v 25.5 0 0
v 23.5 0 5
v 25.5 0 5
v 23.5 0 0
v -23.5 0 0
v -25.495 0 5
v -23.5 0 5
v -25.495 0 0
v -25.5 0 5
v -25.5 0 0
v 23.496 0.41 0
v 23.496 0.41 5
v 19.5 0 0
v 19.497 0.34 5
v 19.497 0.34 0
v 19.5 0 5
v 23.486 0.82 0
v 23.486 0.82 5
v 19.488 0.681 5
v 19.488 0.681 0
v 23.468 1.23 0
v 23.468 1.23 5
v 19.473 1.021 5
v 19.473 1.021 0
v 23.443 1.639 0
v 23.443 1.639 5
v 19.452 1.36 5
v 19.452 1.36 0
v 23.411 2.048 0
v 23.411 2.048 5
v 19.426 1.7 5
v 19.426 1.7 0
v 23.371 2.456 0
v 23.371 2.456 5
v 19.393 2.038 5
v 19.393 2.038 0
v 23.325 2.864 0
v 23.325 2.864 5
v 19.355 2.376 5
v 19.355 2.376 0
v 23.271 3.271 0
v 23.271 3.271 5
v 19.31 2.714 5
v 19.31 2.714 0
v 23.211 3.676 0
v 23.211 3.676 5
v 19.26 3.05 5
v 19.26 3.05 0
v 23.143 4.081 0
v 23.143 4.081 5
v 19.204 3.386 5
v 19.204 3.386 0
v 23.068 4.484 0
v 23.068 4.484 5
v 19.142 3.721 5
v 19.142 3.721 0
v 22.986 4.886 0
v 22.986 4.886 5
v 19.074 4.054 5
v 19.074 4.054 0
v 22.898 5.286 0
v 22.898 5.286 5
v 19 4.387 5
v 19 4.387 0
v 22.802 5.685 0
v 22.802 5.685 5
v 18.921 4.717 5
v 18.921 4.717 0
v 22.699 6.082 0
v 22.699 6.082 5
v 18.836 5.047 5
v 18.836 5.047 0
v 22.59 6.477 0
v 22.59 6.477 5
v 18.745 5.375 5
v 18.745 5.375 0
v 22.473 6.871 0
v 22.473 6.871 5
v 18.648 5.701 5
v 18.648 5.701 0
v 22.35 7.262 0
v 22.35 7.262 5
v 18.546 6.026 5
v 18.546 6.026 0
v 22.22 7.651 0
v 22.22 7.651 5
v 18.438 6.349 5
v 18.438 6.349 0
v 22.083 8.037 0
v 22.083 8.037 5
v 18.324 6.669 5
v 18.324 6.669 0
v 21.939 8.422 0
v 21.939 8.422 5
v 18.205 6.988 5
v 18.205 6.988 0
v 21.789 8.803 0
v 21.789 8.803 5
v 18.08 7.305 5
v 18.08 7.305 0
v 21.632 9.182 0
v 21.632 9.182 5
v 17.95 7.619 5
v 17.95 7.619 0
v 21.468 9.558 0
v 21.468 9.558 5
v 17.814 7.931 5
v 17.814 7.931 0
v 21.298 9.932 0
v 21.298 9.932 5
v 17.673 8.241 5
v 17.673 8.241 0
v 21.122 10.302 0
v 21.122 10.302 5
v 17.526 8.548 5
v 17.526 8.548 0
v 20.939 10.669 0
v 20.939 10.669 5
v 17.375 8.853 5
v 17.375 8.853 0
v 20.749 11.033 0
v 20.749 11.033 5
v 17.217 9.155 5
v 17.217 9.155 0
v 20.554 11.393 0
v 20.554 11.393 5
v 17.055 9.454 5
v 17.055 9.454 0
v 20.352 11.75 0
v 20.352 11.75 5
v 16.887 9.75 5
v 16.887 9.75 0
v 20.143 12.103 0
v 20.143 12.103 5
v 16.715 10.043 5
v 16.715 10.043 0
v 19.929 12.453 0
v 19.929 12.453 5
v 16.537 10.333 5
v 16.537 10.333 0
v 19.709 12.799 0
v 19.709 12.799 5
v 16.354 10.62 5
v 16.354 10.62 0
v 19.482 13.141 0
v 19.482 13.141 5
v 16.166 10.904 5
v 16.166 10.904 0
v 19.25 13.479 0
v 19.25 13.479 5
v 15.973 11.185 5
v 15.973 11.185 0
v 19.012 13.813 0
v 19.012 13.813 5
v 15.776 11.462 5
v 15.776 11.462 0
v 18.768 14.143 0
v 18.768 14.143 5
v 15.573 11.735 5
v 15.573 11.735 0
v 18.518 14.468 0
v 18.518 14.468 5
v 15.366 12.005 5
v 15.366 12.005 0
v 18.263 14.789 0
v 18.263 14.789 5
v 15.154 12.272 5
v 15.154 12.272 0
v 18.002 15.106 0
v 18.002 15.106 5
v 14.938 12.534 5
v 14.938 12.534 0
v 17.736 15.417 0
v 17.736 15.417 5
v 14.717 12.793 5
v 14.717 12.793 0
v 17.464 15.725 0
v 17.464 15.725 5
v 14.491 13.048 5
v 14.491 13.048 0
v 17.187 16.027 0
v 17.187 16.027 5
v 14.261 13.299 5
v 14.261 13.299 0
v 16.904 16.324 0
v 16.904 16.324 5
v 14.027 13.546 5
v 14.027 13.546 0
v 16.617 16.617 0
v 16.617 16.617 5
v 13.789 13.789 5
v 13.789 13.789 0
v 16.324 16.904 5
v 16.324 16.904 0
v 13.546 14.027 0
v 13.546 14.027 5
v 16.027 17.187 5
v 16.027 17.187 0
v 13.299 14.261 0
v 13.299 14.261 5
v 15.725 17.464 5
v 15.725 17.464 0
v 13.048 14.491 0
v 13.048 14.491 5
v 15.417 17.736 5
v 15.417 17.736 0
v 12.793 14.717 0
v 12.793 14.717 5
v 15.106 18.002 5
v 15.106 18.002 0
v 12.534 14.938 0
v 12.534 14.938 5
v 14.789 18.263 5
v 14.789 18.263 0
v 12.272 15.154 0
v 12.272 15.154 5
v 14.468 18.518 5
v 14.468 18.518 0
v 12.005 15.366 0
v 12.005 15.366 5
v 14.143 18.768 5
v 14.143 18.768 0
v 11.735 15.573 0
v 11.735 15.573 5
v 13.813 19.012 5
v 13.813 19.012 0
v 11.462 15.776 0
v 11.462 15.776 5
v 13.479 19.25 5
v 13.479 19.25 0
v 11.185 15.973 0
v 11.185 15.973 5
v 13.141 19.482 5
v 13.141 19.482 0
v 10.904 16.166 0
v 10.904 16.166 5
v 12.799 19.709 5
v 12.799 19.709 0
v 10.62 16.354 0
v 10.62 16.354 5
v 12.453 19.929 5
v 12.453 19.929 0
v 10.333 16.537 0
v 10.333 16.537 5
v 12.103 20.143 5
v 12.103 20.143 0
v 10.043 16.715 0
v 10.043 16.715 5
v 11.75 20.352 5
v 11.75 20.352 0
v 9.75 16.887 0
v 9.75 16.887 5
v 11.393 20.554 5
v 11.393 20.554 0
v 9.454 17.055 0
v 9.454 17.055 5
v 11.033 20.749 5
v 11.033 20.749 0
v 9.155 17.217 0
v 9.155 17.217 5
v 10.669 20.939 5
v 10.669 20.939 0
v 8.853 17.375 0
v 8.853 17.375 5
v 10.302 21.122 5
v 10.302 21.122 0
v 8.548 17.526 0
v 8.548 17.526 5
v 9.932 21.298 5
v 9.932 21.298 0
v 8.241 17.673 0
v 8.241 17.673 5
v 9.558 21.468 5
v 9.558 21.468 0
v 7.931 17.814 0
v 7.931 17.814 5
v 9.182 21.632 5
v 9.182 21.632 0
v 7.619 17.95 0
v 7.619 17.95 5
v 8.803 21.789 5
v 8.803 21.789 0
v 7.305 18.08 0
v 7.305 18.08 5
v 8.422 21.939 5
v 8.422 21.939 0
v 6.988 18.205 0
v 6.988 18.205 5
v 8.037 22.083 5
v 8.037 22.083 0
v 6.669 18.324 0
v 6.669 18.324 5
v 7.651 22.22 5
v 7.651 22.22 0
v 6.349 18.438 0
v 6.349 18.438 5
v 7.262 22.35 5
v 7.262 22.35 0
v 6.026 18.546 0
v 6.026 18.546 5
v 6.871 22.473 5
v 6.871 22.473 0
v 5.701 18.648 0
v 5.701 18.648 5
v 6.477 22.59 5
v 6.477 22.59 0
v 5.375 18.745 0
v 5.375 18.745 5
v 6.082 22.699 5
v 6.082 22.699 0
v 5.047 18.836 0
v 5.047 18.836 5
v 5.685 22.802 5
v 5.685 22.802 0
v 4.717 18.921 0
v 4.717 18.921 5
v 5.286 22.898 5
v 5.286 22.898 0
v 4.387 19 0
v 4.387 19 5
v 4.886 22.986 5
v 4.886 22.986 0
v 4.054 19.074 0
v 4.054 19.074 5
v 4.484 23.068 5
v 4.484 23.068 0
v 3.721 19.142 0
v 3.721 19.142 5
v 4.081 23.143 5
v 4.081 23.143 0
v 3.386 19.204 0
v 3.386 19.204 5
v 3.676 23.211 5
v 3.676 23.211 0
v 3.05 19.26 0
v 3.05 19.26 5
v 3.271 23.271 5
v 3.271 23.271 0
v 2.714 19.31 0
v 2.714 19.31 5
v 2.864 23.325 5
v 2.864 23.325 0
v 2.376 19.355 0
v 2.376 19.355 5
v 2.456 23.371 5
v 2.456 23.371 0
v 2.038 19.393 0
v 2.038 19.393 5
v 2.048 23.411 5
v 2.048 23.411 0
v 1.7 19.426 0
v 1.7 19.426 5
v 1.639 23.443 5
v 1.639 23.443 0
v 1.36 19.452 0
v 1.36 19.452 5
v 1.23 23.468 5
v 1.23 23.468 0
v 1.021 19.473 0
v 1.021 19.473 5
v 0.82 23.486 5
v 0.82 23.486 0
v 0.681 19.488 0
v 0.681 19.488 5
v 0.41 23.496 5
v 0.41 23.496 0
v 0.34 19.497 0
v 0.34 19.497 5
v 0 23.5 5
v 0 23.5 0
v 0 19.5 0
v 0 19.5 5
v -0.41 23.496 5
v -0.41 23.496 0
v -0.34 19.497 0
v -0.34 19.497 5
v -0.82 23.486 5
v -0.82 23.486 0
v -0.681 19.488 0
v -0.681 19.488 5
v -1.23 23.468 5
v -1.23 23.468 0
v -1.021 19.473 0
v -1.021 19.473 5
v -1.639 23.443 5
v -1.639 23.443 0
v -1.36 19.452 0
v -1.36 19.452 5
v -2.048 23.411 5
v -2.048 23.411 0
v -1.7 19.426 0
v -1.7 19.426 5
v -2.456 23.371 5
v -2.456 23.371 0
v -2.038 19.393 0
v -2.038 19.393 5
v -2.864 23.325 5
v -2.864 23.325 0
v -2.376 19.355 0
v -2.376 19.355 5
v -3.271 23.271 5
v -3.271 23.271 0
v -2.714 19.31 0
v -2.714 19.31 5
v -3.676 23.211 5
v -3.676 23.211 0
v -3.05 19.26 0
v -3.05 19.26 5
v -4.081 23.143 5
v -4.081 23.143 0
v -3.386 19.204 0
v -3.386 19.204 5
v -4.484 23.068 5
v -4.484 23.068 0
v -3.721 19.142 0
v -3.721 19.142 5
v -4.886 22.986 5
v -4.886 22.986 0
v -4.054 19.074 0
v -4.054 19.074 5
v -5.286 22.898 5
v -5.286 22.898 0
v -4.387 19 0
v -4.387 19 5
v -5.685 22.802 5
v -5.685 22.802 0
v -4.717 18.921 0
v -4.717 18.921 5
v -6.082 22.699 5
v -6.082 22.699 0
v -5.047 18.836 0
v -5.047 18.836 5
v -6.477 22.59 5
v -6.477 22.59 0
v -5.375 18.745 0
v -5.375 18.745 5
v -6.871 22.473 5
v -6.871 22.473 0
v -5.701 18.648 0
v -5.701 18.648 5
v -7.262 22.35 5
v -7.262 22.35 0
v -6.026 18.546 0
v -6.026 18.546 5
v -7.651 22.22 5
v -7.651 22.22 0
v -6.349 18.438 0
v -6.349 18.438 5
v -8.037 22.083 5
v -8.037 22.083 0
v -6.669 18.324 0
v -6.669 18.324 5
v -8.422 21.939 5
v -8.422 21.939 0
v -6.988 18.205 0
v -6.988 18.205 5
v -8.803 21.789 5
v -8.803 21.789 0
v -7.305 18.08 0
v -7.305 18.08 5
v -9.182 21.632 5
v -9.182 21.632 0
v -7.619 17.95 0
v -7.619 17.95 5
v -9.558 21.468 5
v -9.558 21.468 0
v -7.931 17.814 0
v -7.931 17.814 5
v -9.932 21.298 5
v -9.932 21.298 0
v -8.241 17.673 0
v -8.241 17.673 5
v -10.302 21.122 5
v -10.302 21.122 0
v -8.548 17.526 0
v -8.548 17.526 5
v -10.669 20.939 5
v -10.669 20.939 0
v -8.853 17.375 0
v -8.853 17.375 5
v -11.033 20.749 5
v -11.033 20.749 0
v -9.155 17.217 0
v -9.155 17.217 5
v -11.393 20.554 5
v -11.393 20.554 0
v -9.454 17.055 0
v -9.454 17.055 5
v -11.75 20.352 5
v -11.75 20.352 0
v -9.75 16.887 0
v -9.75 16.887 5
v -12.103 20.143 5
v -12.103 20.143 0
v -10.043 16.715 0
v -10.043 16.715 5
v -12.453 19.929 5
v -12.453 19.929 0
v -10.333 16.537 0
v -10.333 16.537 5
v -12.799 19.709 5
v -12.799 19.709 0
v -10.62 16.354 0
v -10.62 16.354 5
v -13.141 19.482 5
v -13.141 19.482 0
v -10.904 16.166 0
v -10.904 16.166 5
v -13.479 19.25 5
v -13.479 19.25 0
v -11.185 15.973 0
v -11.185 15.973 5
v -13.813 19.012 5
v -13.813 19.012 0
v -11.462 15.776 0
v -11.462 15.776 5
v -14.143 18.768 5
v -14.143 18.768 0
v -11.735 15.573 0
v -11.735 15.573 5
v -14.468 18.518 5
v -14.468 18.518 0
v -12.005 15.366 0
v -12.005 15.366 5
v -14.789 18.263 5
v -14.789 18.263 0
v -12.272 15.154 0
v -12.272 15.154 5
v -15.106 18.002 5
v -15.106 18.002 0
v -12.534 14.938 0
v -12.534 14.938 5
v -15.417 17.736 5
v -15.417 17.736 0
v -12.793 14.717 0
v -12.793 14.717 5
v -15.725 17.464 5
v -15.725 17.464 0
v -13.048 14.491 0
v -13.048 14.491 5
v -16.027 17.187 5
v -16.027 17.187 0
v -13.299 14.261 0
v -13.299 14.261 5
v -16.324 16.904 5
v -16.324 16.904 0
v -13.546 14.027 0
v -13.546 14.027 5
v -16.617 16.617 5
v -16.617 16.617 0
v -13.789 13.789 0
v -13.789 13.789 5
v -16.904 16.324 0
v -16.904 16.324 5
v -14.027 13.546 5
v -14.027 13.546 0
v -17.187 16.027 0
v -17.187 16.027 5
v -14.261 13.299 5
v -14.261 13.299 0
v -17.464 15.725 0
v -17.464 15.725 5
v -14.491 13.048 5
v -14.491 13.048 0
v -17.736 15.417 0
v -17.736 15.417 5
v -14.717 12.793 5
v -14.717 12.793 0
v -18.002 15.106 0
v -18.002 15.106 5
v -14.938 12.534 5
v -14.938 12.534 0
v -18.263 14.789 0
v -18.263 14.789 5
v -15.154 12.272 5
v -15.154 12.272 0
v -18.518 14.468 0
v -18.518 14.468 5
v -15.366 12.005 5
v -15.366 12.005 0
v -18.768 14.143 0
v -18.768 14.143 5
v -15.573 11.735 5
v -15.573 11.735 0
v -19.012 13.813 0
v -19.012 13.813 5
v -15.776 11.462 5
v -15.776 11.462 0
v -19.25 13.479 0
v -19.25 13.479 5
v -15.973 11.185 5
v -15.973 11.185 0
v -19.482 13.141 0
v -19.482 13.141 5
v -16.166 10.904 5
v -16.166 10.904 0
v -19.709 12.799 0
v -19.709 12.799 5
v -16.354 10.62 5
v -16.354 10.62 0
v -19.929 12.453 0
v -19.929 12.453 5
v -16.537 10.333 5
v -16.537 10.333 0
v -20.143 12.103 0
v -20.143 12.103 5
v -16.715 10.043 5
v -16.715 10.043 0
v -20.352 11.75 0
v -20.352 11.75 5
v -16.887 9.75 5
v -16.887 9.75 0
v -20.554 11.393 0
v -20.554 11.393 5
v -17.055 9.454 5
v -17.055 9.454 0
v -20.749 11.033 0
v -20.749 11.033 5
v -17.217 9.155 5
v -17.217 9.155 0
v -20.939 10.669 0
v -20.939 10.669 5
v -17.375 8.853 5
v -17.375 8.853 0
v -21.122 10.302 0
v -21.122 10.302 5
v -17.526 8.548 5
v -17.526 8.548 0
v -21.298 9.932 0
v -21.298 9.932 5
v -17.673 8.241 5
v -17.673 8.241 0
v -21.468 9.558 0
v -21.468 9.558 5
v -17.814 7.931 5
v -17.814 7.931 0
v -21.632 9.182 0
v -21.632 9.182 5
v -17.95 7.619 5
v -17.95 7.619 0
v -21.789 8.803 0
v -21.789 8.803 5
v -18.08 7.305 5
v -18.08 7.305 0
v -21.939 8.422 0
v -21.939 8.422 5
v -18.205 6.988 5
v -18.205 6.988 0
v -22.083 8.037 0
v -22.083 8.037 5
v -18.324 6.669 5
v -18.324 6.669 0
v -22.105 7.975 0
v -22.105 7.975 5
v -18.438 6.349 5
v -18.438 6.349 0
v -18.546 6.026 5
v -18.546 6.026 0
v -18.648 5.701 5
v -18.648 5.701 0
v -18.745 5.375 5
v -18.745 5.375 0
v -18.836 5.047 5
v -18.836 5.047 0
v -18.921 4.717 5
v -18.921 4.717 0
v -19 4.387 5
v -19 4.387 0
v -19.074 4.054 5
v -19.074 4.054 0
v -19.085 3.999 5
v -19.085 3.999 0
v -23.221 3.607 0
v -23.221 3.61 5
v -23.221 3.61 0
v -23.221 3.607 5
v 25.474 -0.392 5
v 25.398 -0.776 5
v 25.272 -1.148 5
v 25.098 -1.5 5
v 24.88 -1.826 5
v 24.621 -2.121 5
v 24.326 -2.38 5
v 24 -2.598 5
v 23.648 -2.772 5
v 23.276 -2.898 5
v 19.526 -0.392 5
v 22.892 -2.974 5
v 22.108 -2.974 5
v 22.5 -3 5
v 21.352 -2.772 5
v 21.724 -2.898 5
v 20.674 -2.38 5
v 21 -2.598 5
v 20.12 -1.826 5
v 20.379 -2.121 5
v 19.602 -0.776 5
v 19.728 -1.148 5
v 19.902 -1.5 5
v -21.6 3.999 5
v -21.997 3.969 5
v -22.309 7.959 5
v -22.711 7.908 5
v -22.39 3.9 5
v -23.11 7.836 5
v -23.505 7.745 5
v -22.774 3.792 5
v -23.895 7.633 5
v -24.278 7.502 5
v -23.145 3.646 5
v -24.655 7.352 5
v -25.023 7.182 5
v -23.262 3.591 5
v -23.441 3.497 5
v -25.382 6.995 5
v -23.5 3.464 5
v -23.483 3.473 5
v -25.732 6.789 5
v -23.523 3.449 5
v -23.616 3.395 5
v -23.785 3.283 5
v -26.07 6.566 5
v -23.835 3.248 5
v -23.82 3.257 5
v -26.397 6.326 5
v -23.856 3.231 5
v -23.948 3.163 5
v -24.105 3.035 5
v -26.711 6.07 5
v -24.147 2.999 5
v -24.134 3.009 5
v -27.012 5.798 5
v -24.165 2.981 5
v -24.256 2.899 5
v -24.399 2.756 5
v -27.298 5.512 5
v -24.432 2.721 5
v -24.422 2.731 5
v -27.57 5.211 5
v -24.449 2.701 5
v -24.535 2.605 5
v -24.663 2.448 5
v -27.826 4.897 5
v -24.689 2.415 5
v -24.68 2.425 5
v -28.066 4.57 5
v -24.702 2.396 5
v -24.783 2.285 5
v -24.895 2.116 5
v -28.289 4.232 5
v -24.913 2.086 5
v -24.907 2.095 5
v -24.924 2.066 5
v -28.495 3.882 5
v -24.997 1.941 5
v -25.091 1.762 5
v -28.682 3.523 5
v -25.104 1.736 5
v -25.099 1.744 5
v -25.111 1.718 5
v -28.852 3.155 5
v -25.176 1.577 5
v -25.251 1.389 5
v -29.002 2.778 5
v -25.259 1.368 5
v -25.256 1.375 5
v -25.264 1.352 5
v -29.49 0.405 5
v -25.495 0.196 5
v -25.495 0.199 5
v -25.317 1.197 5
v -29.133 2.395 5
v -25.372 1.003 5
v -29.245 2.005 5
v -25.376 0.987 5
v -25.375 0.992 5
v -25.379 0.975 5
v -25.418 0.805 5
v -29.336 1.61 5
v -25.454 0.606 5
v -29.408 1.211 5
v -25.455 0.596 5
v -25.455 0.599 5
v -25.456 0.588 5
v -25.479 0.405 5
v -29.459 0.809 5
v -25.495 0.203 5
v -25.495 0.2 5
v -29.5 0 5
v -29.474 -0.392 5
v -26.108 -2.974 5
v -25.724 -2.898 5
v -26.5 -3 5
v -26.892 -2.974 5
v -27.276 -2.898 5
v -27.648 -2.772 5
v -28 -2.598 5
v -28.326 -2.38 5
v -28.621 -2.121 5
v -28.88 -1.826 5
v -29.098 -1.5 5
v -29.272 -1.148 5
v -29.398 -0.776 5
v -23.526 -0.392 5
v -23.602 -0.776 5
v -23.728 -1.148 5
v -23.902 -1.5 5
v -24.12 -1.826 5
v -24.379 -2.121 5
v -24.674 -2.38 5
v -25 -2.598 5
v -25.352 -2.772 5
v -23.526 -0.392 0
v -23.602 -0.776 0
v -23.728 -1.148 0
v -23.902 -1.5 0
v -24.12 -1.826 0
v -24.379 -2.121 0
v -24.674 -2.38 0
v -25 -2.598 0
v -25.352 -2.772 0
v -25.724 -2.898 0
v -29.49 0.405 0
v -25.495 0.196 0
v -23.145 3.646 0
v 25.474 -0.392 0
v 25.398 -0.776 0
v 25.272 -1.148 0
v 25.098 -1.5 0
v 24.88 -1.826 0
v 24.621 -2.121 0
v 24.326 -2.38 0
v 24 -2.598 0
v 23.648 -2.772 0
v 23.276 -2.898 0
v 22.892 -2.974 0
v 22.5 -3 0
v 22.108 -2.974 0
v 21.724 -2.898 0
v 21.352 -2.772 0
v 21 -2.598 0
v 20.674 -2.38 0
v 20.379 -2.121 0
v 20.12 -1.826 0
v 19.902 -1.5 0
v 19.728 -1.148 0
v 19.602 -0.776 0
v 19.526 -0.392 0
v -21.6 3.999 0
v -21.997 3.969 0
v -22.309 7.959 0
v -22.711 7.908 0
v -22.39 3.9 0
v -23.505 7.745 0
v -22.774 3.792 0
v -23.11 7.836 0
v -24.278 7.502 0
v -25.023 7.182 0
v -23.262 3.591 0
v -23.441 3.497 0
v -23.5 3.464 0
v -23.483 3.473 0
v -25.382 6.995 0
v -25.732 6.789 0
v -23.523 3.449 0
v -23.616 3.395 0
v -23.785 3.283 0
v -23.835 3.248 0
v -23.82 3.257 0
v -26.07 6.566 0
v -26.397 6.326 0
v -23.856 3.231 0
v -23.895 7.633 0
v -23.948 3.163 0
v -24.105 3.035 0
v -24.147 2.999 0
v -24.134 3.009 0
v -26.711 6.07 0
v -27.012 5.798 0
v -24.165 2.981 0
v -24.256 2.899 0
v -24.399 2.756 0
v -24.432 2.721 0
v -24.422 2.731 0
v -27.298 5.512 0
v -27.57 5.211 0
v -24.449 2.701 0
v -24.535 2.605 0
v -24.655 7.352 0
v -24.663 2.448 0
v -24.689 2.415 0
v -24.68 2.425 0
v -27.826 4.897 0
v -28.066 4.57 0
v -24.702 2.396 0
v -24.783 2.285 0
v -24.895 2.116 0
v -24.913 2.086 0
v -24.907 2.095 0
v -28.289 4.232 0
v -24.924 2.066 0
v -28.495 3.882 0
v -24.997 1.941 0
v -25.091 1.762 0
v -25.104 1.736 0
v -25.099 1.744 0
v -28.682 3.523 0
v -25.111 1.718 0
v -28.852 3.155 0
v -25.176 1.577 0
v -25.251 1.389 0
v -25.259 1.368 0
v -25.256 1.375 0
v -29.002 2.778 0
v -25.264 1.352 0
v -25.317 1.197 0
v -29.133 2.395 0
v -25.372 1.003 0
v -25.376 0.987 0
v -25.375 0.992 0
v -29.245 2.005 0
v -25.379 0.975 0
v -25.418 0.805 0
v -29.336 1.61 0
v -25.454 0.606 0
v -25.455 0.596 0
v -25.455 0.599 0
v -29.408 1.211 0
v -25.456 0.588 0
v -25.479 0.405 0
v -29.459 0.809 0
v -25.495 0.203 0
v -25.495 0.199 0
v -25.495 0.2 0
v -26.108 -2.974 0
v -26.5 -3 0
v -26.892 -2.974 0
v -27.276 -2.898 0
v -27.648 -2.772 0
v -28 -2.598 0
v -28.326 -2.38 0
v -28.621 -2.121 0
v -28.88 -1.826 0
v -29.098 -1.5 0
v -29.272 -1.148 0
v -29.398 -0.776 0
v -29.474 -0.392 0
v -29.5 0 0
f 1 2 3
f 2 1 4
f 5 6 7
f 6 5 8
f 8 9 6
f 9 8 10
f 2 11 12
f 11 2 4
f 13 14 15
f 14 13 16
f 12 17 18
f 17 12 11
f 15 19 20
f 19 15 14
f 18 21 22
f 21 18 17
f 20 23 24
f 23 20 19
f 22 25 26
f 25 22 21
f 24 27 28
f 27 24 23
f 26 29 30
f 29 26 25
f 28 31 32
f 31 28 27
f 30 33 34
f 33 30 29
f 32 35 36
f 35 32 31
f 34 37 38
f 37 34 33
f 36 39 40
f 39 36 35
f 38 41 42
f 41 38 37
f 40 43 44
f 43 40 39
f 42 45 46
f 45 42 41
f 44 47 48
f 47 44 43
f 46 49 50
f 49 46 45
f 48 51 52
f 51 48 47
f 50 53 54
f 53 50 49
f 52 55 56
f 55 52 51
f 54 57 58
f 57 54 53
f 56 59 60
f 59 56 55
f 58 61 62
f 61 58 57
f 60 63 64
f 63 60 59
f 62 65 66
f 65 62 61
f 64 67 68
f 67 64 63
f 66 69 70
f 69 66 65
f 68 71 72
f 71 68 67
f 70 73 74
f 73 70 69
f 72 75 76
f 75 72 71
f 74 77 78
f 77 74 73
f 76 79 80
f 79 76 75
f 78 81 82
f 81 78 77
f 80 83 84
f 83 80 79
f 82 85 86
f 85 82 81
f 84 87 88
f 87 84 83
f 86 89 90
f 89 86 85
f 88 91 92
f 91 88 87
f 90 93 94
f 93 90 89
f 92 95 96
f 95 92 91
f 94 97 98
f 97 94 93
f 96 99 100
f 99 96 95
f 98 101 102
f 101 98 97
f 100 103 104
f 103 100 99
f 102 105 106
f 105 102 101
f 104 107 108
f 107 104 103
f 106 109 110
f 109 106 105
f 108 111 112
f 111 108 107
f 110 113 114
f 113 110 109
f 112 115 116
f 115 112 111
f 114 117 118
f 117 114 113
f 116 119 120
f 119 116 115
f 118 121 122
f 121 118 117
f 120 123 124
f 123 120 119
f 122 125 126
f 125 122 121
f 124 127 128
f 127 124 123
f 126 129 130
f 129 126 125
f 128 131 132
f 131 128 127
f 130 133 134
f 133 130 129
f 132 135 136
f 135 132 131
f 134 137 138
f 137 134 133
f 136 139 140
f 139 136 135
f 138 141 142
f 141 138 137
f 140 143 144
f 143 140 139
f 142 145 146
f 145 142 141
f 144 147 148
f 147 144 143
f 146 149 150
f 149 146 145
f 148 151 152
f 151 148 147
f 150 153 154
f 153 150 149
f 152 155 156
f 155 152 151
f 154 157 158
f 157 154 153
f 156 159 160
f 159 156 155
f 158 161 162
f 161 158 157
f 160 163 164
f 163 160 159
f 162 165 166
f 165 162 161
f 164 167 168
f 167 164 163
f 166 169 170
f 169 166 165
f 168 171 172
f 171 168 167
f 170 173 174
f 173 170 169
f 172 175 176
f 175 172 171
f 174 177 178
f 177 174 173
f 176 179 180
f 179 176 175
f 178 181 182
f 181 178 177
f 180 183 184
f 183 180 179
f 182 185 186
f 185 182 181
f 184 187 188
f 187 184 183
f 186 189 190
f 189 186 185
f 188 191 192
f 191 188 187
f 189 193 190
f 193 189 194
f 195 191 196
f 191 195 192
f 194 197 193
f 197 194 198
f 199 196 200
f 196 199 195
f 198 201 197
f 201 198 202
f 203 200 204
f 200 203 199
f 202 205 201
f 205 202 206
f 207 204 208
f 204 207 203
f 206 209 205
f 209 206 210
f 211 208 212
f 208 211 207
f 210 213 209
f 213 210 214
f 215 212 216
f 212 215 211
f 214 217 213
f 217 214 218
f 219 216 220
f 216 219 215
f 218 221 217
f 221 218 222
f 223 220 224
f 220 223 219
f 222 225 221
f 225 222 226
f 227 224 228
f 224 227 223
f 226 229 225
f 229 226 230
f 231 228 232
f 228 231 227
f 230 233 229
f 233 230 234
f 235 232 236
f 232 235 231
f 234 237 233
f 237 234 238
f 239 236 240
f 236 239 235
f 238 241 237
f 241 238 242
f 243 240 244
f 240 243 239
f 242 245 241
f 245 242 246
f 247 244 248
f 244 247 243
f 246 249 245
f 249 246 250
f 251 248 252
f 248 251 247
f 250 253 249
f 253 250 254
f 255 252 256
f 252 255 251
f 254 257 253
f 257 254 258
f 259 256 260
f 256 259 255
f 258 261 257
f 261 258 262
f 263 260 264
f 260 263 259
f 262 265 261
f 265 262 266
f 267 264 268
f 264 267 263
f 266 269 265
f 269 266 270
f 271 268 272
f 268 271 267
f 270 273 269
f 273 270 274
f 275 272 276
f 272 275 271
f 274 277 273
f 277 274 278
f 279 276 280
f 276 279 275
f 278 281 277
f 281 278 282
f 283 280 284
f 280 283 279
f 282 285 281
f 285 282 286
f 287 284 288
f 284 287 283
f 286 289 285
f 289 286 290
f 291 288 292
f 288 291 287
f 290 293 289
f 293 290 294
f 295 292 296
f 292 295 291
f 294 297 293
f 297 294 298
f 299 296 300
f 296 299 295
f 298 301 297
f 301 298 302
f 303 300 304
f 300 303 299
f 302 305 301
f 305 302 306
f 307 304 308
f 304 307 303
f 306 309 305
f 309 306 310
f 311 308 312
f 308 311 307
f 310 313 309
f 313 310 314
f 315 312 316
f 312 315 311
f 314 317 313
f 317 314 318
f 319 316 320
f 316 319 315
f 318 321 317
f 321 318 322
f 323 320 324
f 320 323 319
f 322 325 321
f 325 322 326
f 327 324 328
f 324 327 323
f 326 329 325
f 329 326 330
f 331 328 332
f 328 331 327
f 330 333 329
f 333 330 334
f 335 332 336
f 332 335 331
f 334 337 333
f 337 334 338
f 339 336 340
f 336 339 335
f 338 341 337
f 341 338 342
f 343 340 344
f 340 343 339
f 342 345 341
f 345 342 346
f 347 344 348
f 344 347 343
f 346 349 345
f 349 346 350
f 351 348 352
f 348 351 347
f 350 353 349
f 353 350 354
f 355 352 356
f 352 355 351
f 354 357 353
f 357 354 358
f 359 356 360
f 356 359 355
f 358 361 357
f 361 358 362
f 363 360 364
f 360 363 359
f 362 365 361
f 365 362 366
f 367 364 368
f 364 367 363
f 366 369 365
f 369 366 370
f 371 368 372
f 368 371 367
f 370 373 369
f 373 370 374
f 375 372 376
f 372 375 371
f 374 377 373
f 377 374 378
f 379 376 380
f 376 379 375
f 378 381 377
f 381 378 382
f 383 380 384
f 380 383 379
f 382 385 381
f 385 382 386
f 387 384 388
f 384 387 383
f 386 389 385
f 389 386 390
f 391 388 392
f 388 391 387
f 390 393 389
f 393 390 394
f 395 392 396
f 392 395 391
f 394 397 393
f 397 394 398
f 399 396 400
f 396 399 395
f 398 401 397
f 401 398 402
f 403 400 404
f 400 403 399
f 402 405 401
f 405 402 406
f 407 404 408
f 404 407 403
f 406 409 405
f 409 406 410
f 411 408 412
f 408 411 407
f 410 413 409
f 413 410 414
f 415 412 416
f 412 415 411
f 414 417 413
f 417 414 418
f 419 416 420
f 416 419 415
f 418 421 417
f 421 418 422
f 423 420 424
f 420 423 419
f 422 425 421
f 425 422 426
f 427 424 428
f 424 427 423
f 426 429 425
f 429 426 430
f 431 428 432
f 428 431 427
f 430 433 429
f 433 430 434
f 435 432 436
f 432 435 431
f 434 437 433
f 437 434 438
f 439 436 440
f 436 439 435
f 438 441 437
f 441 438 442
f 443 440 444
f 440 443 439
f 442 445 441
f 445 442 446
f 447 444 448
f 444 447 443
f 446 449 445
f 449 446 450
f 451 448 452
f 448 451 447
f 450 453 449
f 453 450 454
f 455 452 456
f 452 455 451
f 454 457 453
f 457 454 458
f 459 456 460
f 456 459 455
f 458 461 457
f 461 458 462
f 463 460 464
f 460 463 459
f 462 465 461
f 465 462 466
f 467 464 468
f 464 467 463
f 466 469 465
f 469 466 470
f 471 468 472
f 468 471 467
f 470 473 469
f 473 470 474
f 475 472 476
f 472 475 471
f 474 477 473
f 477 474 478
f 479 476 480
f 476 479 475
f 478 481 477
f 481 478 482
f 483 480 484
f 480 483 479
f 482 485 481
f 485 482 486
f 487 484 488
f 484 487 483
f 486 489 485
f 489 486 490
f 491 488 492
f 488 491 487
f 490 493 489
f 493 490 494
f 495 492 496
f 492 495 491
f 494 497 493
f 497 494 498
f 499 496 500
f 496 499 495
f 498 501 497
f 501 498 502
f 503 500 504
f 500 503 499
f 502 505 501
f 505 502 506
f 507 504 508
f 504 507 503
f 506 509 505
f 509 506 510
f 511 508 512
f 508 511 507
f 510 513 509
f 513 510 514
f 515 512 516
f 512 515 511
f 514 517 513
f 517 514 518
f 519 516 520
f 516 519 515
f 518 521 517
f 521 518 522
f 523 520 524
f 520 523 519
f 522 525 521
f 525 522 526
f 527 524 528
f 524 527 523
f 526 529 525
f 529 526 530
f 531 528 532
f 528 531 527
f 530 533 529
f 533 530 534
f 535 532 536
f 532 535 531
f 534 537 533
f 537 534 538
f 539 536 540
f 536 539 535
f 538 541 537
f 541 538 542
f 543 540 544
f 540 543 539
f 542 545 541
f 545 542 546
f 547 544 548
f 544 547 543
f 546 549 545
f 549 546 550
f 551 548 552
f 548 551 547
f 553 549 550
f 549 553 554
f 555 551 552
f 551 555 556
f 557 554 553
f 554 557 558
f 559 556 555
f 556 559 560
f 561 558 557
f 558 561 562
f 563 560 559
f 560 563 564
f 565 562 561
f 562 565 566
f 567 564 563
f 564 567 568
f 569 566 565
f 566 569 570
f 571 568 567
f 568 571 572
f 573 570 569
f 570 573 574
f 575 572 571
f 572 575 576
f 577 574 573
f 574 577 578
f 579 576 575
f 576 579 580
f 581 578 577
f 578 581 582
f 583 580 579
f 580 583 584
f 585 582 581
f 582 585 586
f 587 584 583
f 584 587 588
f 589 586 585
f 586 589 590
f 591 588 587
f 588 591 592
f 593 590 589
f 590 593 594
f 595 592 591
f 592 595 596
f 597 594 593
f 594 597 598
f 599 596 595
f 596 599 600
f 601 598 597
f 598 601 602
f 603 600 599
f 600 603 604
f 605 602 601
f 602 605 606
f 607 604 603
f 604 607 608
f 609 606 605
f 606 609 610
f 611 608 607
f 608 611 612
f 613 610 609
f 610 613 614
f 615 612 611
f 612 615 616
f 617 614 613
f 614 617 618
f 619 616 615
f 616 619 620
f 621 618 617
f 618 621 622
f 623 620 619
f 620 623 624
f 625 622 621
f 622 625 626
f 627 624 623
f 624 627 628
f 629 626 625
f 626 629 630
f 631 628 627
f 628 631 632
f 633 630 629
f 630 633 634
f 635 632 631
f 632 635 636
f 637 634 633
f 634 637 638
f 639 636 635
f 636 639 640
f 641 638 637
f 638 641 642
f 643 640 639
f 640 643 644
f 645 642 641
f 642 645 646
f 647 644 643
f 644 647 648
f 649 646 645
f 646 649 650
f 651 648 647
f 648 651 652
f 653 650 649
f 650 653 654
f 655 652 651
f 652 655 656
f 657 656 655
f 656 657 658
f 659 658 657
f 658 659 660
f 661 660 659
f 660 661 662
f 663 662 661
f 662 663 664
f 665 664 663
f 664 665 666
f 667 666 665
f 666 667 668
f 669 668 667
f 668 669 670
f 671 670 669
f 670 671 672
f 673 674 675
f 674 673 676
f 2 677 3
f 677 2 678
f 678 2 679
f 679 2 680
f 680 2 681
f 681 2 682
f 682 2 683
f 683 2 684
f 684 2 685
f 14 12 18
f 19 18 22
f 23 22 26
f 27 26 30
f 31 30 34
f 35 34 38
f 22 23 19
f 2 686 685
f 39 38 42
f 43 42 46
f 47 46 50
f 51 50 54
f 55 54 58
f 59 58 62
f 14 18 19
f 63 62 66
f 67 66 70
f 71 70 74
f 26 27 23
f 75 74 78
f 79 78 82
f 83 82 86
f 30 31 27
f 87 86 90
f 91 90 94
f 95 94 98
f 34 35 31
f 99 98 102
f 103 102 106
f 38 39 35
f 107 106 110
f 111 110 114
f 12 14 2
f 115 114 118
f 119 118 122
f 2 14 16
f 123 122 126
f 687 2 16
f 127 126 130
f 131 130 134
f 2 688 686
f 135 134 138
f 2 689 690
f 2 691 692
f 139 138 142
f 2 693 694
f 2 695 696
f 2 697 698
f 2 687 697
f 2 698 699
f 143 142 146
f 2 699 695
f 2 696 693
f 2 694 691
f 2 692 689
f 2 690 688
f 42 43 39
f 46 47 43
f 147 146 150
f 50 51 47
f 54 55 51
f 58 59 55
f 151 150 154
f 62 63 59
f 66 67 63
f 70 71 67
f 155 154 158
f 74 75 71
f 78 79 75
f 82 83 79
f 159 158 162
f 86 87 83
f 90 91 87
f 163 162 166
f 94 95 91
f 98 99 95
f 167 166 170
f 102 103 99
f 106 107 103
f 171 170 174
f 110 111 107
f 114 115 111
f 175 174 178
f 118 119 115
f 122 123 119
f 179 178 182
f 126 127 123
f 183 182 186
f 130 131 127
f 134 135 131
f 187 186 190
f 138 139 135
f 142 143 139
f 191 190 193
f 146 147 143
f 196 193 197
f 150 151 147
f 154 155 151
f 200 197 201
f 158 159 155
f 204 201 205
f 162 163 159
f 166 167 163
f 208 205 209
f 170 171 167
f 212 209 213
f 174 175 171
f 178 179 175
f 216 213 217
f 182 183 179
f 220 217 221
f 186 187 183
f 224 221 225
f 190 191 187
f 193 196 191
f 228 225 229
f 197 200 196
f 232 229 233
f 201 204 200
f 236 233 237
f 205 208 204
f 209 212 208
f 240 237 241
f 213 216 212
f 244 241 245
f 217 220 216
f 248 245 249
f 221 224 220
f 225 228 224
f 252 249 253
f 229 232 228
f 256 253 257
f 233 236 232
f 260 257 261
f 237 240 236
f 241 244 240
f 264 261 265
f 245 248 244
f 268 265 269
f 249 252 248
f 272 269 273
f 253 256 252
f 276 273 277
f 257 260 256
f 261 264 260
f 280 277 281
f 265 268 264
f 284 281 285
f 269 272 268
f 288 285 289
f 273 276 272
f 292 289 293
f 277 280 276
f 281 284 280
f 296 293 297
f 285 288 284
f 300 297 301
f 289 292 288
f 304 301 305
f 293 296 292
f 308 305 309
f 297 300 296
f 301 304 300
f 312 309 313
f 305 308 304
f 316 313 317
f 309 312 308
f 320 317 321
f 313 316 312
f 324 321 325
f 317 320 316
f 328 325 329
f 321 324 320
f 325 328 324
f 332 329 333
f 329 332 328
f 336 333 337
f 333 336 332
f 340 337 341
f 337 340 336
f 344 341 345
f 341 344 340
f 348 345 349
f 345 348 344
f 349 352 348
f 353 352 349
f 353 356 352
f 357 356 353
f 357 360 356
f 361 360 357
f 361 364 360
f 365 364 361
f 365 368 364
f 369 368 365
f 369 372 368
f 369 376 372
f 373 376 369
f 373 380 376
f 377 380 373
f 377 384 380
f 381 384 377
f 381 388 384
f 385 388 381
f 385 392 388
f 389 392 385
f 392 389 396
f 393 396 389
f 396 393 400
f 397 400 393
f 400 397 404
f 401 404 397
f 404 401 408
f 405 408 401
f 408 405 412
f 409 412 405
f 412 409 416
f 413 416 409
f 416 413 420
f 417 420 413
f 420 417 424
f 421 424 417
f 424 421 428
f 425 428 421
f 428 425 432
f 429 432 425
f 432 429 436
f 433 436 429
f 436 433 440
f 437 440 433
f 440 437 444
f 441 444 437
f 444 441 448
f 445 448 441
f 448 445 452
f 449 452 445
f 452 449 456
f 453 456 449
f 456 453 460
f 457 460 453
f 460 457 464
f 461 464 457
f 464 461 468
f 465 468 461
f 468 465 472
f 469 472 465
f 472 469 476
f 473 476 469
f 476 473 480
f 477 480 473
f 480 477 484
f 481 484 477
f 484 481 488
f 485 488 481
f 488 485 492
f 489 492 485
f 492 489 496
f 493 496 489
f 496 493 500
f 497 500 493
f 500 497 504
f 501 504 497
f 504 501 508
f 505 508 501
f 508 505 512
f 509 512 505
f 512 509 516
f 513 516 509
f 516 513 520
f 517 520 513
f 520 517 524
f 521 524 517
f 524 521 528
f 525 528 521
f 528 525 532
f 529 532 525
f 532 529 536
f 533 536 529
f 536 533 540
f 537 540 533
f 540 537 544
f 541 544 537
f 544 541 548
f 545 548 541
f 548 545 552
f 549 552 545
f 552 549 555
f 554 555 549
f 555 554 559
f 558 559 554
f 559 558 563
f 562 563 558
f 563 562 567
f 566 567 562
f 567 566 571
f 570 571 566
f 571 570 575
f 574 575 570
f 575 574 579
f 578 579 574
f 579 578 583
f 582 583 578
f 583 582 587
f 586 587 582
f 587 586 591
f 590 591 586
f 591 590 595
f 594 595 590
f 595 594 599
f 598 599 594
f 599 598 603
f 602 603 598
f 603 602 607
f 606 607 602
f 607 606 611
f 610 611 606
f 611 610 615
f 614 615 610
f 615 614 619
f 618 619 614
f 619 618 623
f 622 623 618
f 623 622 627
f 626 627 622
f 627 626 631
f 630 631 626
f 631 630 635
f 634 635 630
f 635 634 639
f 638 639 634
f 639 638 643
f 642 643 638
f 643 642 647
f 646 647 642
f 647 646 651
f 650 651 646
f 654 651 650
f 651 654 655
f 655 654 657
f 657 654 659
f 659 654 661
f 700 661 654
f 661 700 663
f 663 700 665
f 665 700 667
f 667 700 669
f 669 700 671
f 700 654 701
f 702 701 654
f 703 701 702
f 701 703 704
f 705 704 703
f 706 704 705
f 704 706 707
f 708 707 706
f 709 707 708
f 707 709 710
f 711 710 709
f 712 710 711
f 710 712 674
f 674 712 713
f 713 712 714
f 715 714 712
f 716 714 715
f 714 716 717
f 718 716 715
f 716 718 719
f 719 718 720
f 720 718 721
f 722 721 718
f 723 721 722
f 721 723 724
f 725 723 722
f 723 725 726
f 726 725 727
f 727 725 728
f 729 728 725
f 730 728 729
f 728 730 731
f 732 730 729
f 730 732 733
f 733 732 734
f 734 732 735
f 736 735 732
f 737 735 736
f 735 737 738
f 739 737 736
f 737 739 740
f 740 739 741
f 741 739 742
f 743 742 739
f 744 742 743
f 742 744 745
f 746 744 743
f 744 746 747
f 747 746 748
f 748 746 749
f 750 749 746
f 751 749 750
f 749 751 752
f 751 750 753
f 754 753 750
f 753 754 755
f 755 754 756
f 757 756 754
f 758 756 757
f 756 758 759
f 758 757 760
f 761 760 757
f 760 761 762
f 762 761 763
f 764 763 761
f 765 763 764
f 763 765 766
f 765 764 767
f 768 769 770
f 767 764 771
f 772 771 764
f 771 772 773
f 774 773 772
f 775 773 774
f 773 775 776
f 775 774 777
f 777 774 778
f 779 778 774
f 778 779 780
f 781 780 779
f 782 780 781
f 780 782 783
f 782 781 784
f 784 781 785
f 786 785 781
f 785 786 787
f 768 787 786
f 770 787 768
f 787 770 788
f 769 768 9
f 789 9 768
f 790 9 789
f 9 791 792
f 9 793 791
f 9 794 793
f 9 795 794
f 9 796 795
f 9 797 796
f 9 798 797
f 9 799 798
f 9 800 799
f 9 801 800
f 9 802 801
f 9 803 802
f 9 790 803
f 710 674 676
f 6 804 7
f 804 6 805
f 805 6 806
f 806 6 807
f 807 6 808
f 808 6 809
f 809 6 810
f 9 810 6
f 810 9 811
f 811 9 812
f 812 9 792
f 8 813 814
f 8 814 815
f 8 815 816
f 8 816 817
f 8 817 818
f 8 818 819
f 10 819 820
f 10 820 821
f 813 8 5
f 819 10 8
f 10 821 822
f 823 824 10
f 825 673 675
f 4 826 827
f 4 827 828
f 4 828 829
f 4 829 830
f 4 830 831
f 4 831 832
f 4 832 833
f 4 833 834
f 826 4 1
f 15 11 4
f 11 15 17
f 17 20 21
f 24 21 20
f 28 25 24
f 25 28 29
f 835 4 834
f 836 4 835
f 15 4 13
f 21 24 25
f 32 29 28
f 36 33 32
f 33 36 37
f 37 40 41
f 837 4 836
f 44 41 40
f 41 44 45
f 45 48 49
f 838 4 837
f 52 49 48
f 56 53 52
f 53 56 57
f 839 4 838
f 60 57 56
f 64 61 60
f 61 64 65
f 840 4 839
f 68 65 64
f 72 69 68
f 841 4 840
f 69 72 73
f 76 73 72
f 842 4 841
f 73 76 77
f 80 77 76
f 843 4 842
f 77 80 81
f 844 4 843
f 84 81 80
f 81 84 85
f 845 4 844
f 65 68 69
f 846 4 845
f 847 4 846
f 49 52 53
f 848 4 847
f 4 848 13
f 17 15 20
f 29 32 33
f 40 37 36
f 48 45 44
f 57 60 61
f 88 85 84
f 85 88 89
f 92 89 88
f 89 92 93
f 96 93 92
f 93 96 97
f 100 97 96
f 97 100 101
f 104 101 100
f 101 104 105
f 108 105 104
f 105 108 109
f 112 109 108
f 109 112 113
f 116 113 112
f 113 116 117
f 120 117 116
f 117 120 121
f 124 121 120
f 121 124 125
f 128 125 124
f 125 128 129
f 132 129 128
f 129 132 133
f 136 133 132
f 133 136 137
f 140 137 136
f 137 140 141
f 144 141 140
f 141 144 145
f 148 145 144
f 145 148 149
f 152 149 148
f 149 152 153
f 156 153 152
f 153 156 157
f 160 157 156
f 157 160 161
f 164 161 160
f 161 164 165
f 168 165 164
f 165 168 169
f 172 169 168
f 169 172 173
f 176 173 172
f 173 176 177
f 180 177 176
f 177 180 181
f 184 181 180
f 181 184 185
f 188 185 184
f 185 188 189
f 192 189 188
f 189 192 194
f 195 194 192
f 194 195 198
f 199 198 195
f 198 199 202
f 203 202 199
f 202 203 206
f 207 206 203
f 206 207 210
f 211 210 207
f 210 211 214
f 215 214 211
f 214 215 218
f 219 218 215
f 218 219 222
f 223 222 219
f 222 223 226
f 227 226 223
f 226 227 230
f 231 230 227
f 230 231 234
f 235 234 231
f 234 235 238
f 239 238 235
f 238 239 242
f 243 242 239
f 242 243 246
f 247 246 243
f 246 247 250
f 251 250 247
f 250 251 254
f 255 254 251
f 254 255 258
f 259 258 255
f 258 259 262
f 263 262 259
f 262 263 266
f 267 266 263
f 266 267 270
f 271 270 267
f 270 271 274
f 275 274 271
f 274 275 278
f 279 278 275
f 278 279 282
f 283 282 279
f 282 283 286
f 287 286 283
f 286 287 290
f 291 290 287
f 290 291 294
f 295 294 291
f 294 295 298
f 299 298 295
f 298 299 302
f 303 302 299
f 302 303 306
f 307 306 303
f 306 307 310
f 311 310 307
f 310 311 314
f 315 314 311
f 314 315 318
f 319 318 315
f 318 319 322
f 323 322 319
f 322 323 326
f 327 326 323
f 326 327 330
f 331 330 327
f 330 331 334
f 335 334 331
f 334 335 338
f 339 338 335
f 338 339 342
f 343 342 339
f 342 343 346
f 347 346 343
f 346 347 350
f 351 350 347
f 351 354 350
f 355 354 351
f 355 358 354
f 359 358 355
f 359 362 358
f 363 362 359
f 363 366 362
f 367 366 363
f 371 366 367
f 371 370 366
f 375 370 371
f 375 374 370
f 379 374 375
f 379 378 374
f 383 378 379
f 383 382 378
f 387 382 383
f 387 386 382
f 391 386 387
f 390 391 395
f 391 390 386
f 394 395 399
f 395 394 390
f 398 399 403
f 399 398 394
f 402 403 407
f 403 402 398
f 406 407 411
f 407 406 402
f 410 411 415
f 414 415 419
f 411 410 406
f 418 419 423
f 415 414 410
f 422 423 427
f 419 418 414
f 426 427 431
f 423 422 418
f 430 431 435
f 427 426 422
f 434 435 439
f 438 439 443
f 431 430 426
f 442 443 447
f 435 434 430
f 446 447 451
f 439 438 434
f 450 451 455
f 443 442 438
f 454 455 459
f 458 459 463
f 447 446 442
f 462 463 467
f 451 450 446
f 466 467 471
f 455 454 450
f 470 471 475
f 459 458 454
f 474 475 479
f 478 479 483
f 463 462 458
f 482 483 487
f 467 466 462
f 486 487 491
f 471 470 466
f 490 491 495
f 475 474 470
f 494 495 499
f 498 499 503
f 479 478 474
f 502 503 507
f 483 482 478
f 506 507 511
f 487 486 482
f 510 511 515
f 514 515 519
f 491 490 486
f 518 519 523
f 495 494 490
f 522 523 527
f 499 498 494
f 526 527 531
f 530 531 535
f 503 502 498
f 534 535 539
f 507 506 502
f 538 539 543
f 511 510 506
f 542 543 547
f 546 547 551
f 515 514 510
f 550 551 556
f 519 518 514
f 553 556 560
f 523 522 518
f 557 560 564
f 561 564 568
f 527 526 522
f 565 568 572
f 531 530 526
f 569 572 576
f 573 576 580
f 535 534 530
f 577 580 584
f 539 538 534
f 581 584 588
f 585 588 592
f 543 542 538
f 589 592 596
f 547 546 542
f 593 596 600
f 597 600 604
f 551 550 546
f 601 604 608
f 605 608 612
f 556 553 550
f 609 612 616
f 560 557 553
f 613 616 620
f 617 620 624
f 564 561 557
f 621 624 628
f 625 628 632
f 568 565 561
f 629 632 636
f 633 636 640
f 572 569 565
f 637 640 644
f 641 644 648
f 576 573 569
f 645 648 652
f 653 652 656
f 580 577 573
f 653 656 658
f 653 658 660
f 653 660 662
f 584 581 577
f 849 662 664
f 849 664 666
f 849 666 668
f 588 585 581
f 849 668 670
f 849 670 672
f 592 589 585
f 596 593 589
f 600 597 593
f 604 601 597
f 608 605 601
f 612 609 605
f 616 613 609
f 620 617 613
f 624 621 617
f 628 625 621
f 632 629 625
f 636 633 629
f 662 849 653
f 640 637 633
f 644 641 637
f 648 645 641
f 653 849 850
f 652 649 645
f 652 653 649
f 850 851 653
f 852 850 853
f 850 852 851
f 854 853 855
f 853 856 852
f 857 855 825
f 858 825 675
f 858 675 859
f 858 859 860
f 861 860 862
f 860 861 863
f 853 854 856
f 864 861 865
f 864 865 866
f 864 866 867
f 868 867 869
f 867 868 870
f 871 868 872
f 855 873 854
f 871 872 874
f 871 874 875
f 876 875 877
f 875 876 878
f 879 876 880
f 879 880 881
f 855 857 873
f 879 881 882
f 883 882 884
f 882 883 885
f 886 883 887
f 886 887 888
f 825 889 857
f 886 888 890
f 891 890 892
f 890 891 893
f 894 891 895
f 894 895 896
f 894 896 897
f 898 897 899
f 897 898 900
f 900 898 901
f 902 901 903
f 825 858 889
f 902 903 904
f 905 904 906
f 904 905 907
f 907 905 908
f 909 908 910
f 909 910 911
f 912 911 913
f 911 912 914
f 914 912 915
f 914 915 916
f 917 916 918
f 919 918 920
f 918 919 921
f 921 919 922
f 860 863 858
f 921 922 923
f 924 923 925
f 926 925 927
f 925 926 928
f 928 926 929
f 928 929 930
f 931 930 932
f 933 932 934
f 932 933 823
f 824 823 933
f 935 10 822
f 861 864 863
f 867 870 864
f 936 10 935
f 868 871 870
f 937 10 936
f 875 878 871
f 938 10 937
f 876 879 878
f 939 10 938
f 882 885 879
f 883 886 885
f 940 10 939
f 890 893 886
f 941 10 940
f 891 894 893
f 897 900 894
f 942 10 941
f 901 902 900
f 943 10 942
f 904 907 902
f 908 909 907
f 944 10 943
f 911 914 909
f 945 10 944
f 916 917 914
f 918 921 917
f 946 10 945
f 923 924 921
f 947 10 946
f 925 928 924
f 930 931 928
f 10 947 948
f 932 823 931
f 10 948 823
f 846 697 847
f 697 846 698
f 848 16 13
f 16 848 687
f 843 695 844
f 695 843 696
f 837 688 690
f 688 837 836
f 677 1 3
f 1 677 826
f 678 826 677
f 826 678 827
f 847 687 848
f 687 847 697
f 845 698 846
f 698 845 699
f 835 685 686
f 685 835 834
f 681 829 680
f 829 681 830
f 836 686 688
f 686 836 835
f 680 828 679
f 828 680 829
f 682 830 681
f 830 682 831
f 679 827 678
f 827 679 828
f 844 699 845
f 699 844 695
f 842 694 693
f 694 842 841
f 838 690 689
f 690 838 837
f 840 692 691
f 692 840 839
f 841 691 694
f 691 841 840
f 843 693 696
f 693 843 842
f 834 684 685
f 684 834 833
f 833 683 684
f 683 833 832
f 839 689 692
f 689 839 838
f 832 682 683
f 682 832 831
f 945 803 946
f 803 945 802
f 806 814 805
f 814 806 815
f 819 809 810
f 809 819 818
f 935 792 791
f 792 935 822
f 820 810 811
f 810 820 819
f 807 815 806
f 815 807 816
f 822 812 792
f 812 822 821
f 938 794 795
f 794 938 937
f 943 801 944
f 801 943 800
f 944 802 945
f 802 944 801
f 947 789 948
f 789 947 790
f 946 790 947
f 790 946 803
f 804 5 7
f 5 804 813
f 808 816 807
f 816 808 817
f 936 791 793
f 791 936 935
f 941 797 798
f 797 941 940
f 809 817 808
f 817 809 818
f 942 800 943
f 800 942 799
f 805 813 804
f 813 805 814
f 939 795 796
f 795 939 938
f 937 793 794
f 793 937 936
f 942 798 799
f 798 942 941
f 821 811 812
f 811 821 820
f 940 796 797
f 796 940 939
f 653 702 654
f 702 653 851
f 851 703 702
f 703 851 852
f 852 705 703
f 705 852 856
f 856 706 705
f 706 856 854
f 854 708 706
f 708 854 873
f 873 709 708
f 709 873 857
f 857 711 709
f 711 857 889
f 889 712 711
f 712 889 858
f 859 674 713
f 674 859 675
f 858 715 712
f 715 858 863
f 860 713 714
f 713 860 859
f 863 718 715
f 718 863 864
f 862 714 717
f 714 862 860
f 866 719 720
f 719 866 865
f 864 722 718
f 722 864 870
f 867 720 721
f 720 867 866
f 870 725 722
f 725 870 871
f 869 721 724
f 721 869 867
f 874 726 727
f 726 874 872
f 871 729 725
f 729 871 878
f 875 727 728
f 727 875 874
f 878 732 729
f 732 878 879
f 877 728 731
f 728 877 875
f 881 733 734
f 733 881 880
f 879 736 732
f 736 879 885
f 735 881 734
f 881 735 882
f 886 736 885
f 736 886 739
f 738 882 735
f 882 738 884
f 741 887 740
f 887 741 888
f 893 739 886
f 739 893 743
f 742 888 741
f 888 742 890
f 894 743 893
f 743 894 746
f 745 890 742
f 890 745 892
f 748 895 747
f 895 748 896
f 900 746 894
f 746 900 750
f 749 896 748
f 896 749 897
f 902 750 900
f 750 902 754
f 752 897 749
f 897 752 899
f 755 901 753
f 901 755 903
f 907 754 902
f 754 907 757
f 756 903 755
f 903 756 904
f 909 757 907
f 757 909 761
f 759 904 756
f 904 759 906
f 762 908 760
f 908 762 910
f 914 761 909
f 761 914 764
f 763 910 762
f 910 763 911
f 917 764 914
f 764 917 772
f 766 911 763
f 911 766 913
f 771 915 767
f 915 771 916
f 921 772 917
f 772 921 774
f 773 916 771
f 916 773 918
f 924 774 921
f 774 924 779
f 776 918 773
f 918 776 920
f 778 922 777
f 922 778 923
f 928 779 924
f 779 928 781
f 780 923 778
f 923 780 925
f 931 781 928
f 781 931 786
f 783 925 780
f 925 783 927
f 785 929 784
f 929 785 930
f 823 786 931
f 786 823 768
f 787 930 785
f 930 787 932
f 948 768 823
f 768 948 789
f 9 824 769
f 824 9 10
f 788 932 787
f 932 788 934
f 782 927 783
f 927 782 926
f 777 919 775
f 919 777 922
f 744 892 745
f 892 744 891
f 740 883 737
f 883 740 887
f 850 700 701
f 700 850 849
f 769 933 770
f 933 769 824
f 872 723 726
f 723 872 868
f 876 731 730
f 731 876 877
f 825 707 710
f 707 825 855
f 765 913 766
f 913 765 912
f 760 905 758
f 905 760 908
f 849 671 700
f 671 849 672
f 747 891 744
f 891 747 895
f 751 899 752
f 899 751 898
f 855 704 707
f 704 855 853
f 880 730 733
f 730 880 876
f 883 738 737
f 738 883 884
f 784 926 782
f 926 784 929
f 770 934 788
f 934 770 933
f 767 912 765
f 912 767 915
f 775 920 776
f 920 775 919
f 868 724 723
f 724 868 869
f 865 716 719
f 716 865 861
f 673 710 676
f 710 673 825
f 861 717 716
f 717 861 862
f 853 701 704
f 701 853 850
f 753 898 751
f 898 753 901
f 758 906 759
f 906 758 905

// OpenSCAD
// file: interlocking_snap_ring.scad
module half_cylinder(diameter, height) {
    linear_extrude(height)
        difference() {
            circle(diameter / 2);
            translate([0, -diameter/2, 0])
                square(diameter, center=true);
        }
}

module interlocking_snap_ring_helper(inner_radius, thickness, height) {
    rotate_extrude(angle=180)
        translate([inner_radius, 0, 0])
        square([thickness, height]);
    translate([inner_radius + thickness*.75, 0, 0])
        rotate([0, 0, 180])
        half_cylinder(thickness*1.5, height);
    translate([-(inner_radius + (thickness*1.75)), 0, 0])
        rotate([0, 0, 180])
        half_cylinder(thickness*1.5, height);
    translate([-(inner_radius + thickness*.5), 0, 0])
        rotate([0, 0, 90])
        rotate_extrude(angle=90)
        translate([thickness, 0, 0])
        square([thickness, height]);
}

module interlocking_snap_ring(inner_diameter, thickness, height) {
    inner_radius = inner_diameter / 2;
    difference() {
        interlocking_snap_ring_helper(inner_radius, thickness, height);
        hull () {
            translate([-(inner_radius + thickness*.5), 0, 0])
                half_cylinder(thickness*2, height+2);
            cube([thickness, thickness, height+2]);
        }
    }
}
// main file
$fa=1;
$fs=0.4;

include <interlocking_snap_ring.scad>

interlocking_snap_ring(39, 4, 5);
